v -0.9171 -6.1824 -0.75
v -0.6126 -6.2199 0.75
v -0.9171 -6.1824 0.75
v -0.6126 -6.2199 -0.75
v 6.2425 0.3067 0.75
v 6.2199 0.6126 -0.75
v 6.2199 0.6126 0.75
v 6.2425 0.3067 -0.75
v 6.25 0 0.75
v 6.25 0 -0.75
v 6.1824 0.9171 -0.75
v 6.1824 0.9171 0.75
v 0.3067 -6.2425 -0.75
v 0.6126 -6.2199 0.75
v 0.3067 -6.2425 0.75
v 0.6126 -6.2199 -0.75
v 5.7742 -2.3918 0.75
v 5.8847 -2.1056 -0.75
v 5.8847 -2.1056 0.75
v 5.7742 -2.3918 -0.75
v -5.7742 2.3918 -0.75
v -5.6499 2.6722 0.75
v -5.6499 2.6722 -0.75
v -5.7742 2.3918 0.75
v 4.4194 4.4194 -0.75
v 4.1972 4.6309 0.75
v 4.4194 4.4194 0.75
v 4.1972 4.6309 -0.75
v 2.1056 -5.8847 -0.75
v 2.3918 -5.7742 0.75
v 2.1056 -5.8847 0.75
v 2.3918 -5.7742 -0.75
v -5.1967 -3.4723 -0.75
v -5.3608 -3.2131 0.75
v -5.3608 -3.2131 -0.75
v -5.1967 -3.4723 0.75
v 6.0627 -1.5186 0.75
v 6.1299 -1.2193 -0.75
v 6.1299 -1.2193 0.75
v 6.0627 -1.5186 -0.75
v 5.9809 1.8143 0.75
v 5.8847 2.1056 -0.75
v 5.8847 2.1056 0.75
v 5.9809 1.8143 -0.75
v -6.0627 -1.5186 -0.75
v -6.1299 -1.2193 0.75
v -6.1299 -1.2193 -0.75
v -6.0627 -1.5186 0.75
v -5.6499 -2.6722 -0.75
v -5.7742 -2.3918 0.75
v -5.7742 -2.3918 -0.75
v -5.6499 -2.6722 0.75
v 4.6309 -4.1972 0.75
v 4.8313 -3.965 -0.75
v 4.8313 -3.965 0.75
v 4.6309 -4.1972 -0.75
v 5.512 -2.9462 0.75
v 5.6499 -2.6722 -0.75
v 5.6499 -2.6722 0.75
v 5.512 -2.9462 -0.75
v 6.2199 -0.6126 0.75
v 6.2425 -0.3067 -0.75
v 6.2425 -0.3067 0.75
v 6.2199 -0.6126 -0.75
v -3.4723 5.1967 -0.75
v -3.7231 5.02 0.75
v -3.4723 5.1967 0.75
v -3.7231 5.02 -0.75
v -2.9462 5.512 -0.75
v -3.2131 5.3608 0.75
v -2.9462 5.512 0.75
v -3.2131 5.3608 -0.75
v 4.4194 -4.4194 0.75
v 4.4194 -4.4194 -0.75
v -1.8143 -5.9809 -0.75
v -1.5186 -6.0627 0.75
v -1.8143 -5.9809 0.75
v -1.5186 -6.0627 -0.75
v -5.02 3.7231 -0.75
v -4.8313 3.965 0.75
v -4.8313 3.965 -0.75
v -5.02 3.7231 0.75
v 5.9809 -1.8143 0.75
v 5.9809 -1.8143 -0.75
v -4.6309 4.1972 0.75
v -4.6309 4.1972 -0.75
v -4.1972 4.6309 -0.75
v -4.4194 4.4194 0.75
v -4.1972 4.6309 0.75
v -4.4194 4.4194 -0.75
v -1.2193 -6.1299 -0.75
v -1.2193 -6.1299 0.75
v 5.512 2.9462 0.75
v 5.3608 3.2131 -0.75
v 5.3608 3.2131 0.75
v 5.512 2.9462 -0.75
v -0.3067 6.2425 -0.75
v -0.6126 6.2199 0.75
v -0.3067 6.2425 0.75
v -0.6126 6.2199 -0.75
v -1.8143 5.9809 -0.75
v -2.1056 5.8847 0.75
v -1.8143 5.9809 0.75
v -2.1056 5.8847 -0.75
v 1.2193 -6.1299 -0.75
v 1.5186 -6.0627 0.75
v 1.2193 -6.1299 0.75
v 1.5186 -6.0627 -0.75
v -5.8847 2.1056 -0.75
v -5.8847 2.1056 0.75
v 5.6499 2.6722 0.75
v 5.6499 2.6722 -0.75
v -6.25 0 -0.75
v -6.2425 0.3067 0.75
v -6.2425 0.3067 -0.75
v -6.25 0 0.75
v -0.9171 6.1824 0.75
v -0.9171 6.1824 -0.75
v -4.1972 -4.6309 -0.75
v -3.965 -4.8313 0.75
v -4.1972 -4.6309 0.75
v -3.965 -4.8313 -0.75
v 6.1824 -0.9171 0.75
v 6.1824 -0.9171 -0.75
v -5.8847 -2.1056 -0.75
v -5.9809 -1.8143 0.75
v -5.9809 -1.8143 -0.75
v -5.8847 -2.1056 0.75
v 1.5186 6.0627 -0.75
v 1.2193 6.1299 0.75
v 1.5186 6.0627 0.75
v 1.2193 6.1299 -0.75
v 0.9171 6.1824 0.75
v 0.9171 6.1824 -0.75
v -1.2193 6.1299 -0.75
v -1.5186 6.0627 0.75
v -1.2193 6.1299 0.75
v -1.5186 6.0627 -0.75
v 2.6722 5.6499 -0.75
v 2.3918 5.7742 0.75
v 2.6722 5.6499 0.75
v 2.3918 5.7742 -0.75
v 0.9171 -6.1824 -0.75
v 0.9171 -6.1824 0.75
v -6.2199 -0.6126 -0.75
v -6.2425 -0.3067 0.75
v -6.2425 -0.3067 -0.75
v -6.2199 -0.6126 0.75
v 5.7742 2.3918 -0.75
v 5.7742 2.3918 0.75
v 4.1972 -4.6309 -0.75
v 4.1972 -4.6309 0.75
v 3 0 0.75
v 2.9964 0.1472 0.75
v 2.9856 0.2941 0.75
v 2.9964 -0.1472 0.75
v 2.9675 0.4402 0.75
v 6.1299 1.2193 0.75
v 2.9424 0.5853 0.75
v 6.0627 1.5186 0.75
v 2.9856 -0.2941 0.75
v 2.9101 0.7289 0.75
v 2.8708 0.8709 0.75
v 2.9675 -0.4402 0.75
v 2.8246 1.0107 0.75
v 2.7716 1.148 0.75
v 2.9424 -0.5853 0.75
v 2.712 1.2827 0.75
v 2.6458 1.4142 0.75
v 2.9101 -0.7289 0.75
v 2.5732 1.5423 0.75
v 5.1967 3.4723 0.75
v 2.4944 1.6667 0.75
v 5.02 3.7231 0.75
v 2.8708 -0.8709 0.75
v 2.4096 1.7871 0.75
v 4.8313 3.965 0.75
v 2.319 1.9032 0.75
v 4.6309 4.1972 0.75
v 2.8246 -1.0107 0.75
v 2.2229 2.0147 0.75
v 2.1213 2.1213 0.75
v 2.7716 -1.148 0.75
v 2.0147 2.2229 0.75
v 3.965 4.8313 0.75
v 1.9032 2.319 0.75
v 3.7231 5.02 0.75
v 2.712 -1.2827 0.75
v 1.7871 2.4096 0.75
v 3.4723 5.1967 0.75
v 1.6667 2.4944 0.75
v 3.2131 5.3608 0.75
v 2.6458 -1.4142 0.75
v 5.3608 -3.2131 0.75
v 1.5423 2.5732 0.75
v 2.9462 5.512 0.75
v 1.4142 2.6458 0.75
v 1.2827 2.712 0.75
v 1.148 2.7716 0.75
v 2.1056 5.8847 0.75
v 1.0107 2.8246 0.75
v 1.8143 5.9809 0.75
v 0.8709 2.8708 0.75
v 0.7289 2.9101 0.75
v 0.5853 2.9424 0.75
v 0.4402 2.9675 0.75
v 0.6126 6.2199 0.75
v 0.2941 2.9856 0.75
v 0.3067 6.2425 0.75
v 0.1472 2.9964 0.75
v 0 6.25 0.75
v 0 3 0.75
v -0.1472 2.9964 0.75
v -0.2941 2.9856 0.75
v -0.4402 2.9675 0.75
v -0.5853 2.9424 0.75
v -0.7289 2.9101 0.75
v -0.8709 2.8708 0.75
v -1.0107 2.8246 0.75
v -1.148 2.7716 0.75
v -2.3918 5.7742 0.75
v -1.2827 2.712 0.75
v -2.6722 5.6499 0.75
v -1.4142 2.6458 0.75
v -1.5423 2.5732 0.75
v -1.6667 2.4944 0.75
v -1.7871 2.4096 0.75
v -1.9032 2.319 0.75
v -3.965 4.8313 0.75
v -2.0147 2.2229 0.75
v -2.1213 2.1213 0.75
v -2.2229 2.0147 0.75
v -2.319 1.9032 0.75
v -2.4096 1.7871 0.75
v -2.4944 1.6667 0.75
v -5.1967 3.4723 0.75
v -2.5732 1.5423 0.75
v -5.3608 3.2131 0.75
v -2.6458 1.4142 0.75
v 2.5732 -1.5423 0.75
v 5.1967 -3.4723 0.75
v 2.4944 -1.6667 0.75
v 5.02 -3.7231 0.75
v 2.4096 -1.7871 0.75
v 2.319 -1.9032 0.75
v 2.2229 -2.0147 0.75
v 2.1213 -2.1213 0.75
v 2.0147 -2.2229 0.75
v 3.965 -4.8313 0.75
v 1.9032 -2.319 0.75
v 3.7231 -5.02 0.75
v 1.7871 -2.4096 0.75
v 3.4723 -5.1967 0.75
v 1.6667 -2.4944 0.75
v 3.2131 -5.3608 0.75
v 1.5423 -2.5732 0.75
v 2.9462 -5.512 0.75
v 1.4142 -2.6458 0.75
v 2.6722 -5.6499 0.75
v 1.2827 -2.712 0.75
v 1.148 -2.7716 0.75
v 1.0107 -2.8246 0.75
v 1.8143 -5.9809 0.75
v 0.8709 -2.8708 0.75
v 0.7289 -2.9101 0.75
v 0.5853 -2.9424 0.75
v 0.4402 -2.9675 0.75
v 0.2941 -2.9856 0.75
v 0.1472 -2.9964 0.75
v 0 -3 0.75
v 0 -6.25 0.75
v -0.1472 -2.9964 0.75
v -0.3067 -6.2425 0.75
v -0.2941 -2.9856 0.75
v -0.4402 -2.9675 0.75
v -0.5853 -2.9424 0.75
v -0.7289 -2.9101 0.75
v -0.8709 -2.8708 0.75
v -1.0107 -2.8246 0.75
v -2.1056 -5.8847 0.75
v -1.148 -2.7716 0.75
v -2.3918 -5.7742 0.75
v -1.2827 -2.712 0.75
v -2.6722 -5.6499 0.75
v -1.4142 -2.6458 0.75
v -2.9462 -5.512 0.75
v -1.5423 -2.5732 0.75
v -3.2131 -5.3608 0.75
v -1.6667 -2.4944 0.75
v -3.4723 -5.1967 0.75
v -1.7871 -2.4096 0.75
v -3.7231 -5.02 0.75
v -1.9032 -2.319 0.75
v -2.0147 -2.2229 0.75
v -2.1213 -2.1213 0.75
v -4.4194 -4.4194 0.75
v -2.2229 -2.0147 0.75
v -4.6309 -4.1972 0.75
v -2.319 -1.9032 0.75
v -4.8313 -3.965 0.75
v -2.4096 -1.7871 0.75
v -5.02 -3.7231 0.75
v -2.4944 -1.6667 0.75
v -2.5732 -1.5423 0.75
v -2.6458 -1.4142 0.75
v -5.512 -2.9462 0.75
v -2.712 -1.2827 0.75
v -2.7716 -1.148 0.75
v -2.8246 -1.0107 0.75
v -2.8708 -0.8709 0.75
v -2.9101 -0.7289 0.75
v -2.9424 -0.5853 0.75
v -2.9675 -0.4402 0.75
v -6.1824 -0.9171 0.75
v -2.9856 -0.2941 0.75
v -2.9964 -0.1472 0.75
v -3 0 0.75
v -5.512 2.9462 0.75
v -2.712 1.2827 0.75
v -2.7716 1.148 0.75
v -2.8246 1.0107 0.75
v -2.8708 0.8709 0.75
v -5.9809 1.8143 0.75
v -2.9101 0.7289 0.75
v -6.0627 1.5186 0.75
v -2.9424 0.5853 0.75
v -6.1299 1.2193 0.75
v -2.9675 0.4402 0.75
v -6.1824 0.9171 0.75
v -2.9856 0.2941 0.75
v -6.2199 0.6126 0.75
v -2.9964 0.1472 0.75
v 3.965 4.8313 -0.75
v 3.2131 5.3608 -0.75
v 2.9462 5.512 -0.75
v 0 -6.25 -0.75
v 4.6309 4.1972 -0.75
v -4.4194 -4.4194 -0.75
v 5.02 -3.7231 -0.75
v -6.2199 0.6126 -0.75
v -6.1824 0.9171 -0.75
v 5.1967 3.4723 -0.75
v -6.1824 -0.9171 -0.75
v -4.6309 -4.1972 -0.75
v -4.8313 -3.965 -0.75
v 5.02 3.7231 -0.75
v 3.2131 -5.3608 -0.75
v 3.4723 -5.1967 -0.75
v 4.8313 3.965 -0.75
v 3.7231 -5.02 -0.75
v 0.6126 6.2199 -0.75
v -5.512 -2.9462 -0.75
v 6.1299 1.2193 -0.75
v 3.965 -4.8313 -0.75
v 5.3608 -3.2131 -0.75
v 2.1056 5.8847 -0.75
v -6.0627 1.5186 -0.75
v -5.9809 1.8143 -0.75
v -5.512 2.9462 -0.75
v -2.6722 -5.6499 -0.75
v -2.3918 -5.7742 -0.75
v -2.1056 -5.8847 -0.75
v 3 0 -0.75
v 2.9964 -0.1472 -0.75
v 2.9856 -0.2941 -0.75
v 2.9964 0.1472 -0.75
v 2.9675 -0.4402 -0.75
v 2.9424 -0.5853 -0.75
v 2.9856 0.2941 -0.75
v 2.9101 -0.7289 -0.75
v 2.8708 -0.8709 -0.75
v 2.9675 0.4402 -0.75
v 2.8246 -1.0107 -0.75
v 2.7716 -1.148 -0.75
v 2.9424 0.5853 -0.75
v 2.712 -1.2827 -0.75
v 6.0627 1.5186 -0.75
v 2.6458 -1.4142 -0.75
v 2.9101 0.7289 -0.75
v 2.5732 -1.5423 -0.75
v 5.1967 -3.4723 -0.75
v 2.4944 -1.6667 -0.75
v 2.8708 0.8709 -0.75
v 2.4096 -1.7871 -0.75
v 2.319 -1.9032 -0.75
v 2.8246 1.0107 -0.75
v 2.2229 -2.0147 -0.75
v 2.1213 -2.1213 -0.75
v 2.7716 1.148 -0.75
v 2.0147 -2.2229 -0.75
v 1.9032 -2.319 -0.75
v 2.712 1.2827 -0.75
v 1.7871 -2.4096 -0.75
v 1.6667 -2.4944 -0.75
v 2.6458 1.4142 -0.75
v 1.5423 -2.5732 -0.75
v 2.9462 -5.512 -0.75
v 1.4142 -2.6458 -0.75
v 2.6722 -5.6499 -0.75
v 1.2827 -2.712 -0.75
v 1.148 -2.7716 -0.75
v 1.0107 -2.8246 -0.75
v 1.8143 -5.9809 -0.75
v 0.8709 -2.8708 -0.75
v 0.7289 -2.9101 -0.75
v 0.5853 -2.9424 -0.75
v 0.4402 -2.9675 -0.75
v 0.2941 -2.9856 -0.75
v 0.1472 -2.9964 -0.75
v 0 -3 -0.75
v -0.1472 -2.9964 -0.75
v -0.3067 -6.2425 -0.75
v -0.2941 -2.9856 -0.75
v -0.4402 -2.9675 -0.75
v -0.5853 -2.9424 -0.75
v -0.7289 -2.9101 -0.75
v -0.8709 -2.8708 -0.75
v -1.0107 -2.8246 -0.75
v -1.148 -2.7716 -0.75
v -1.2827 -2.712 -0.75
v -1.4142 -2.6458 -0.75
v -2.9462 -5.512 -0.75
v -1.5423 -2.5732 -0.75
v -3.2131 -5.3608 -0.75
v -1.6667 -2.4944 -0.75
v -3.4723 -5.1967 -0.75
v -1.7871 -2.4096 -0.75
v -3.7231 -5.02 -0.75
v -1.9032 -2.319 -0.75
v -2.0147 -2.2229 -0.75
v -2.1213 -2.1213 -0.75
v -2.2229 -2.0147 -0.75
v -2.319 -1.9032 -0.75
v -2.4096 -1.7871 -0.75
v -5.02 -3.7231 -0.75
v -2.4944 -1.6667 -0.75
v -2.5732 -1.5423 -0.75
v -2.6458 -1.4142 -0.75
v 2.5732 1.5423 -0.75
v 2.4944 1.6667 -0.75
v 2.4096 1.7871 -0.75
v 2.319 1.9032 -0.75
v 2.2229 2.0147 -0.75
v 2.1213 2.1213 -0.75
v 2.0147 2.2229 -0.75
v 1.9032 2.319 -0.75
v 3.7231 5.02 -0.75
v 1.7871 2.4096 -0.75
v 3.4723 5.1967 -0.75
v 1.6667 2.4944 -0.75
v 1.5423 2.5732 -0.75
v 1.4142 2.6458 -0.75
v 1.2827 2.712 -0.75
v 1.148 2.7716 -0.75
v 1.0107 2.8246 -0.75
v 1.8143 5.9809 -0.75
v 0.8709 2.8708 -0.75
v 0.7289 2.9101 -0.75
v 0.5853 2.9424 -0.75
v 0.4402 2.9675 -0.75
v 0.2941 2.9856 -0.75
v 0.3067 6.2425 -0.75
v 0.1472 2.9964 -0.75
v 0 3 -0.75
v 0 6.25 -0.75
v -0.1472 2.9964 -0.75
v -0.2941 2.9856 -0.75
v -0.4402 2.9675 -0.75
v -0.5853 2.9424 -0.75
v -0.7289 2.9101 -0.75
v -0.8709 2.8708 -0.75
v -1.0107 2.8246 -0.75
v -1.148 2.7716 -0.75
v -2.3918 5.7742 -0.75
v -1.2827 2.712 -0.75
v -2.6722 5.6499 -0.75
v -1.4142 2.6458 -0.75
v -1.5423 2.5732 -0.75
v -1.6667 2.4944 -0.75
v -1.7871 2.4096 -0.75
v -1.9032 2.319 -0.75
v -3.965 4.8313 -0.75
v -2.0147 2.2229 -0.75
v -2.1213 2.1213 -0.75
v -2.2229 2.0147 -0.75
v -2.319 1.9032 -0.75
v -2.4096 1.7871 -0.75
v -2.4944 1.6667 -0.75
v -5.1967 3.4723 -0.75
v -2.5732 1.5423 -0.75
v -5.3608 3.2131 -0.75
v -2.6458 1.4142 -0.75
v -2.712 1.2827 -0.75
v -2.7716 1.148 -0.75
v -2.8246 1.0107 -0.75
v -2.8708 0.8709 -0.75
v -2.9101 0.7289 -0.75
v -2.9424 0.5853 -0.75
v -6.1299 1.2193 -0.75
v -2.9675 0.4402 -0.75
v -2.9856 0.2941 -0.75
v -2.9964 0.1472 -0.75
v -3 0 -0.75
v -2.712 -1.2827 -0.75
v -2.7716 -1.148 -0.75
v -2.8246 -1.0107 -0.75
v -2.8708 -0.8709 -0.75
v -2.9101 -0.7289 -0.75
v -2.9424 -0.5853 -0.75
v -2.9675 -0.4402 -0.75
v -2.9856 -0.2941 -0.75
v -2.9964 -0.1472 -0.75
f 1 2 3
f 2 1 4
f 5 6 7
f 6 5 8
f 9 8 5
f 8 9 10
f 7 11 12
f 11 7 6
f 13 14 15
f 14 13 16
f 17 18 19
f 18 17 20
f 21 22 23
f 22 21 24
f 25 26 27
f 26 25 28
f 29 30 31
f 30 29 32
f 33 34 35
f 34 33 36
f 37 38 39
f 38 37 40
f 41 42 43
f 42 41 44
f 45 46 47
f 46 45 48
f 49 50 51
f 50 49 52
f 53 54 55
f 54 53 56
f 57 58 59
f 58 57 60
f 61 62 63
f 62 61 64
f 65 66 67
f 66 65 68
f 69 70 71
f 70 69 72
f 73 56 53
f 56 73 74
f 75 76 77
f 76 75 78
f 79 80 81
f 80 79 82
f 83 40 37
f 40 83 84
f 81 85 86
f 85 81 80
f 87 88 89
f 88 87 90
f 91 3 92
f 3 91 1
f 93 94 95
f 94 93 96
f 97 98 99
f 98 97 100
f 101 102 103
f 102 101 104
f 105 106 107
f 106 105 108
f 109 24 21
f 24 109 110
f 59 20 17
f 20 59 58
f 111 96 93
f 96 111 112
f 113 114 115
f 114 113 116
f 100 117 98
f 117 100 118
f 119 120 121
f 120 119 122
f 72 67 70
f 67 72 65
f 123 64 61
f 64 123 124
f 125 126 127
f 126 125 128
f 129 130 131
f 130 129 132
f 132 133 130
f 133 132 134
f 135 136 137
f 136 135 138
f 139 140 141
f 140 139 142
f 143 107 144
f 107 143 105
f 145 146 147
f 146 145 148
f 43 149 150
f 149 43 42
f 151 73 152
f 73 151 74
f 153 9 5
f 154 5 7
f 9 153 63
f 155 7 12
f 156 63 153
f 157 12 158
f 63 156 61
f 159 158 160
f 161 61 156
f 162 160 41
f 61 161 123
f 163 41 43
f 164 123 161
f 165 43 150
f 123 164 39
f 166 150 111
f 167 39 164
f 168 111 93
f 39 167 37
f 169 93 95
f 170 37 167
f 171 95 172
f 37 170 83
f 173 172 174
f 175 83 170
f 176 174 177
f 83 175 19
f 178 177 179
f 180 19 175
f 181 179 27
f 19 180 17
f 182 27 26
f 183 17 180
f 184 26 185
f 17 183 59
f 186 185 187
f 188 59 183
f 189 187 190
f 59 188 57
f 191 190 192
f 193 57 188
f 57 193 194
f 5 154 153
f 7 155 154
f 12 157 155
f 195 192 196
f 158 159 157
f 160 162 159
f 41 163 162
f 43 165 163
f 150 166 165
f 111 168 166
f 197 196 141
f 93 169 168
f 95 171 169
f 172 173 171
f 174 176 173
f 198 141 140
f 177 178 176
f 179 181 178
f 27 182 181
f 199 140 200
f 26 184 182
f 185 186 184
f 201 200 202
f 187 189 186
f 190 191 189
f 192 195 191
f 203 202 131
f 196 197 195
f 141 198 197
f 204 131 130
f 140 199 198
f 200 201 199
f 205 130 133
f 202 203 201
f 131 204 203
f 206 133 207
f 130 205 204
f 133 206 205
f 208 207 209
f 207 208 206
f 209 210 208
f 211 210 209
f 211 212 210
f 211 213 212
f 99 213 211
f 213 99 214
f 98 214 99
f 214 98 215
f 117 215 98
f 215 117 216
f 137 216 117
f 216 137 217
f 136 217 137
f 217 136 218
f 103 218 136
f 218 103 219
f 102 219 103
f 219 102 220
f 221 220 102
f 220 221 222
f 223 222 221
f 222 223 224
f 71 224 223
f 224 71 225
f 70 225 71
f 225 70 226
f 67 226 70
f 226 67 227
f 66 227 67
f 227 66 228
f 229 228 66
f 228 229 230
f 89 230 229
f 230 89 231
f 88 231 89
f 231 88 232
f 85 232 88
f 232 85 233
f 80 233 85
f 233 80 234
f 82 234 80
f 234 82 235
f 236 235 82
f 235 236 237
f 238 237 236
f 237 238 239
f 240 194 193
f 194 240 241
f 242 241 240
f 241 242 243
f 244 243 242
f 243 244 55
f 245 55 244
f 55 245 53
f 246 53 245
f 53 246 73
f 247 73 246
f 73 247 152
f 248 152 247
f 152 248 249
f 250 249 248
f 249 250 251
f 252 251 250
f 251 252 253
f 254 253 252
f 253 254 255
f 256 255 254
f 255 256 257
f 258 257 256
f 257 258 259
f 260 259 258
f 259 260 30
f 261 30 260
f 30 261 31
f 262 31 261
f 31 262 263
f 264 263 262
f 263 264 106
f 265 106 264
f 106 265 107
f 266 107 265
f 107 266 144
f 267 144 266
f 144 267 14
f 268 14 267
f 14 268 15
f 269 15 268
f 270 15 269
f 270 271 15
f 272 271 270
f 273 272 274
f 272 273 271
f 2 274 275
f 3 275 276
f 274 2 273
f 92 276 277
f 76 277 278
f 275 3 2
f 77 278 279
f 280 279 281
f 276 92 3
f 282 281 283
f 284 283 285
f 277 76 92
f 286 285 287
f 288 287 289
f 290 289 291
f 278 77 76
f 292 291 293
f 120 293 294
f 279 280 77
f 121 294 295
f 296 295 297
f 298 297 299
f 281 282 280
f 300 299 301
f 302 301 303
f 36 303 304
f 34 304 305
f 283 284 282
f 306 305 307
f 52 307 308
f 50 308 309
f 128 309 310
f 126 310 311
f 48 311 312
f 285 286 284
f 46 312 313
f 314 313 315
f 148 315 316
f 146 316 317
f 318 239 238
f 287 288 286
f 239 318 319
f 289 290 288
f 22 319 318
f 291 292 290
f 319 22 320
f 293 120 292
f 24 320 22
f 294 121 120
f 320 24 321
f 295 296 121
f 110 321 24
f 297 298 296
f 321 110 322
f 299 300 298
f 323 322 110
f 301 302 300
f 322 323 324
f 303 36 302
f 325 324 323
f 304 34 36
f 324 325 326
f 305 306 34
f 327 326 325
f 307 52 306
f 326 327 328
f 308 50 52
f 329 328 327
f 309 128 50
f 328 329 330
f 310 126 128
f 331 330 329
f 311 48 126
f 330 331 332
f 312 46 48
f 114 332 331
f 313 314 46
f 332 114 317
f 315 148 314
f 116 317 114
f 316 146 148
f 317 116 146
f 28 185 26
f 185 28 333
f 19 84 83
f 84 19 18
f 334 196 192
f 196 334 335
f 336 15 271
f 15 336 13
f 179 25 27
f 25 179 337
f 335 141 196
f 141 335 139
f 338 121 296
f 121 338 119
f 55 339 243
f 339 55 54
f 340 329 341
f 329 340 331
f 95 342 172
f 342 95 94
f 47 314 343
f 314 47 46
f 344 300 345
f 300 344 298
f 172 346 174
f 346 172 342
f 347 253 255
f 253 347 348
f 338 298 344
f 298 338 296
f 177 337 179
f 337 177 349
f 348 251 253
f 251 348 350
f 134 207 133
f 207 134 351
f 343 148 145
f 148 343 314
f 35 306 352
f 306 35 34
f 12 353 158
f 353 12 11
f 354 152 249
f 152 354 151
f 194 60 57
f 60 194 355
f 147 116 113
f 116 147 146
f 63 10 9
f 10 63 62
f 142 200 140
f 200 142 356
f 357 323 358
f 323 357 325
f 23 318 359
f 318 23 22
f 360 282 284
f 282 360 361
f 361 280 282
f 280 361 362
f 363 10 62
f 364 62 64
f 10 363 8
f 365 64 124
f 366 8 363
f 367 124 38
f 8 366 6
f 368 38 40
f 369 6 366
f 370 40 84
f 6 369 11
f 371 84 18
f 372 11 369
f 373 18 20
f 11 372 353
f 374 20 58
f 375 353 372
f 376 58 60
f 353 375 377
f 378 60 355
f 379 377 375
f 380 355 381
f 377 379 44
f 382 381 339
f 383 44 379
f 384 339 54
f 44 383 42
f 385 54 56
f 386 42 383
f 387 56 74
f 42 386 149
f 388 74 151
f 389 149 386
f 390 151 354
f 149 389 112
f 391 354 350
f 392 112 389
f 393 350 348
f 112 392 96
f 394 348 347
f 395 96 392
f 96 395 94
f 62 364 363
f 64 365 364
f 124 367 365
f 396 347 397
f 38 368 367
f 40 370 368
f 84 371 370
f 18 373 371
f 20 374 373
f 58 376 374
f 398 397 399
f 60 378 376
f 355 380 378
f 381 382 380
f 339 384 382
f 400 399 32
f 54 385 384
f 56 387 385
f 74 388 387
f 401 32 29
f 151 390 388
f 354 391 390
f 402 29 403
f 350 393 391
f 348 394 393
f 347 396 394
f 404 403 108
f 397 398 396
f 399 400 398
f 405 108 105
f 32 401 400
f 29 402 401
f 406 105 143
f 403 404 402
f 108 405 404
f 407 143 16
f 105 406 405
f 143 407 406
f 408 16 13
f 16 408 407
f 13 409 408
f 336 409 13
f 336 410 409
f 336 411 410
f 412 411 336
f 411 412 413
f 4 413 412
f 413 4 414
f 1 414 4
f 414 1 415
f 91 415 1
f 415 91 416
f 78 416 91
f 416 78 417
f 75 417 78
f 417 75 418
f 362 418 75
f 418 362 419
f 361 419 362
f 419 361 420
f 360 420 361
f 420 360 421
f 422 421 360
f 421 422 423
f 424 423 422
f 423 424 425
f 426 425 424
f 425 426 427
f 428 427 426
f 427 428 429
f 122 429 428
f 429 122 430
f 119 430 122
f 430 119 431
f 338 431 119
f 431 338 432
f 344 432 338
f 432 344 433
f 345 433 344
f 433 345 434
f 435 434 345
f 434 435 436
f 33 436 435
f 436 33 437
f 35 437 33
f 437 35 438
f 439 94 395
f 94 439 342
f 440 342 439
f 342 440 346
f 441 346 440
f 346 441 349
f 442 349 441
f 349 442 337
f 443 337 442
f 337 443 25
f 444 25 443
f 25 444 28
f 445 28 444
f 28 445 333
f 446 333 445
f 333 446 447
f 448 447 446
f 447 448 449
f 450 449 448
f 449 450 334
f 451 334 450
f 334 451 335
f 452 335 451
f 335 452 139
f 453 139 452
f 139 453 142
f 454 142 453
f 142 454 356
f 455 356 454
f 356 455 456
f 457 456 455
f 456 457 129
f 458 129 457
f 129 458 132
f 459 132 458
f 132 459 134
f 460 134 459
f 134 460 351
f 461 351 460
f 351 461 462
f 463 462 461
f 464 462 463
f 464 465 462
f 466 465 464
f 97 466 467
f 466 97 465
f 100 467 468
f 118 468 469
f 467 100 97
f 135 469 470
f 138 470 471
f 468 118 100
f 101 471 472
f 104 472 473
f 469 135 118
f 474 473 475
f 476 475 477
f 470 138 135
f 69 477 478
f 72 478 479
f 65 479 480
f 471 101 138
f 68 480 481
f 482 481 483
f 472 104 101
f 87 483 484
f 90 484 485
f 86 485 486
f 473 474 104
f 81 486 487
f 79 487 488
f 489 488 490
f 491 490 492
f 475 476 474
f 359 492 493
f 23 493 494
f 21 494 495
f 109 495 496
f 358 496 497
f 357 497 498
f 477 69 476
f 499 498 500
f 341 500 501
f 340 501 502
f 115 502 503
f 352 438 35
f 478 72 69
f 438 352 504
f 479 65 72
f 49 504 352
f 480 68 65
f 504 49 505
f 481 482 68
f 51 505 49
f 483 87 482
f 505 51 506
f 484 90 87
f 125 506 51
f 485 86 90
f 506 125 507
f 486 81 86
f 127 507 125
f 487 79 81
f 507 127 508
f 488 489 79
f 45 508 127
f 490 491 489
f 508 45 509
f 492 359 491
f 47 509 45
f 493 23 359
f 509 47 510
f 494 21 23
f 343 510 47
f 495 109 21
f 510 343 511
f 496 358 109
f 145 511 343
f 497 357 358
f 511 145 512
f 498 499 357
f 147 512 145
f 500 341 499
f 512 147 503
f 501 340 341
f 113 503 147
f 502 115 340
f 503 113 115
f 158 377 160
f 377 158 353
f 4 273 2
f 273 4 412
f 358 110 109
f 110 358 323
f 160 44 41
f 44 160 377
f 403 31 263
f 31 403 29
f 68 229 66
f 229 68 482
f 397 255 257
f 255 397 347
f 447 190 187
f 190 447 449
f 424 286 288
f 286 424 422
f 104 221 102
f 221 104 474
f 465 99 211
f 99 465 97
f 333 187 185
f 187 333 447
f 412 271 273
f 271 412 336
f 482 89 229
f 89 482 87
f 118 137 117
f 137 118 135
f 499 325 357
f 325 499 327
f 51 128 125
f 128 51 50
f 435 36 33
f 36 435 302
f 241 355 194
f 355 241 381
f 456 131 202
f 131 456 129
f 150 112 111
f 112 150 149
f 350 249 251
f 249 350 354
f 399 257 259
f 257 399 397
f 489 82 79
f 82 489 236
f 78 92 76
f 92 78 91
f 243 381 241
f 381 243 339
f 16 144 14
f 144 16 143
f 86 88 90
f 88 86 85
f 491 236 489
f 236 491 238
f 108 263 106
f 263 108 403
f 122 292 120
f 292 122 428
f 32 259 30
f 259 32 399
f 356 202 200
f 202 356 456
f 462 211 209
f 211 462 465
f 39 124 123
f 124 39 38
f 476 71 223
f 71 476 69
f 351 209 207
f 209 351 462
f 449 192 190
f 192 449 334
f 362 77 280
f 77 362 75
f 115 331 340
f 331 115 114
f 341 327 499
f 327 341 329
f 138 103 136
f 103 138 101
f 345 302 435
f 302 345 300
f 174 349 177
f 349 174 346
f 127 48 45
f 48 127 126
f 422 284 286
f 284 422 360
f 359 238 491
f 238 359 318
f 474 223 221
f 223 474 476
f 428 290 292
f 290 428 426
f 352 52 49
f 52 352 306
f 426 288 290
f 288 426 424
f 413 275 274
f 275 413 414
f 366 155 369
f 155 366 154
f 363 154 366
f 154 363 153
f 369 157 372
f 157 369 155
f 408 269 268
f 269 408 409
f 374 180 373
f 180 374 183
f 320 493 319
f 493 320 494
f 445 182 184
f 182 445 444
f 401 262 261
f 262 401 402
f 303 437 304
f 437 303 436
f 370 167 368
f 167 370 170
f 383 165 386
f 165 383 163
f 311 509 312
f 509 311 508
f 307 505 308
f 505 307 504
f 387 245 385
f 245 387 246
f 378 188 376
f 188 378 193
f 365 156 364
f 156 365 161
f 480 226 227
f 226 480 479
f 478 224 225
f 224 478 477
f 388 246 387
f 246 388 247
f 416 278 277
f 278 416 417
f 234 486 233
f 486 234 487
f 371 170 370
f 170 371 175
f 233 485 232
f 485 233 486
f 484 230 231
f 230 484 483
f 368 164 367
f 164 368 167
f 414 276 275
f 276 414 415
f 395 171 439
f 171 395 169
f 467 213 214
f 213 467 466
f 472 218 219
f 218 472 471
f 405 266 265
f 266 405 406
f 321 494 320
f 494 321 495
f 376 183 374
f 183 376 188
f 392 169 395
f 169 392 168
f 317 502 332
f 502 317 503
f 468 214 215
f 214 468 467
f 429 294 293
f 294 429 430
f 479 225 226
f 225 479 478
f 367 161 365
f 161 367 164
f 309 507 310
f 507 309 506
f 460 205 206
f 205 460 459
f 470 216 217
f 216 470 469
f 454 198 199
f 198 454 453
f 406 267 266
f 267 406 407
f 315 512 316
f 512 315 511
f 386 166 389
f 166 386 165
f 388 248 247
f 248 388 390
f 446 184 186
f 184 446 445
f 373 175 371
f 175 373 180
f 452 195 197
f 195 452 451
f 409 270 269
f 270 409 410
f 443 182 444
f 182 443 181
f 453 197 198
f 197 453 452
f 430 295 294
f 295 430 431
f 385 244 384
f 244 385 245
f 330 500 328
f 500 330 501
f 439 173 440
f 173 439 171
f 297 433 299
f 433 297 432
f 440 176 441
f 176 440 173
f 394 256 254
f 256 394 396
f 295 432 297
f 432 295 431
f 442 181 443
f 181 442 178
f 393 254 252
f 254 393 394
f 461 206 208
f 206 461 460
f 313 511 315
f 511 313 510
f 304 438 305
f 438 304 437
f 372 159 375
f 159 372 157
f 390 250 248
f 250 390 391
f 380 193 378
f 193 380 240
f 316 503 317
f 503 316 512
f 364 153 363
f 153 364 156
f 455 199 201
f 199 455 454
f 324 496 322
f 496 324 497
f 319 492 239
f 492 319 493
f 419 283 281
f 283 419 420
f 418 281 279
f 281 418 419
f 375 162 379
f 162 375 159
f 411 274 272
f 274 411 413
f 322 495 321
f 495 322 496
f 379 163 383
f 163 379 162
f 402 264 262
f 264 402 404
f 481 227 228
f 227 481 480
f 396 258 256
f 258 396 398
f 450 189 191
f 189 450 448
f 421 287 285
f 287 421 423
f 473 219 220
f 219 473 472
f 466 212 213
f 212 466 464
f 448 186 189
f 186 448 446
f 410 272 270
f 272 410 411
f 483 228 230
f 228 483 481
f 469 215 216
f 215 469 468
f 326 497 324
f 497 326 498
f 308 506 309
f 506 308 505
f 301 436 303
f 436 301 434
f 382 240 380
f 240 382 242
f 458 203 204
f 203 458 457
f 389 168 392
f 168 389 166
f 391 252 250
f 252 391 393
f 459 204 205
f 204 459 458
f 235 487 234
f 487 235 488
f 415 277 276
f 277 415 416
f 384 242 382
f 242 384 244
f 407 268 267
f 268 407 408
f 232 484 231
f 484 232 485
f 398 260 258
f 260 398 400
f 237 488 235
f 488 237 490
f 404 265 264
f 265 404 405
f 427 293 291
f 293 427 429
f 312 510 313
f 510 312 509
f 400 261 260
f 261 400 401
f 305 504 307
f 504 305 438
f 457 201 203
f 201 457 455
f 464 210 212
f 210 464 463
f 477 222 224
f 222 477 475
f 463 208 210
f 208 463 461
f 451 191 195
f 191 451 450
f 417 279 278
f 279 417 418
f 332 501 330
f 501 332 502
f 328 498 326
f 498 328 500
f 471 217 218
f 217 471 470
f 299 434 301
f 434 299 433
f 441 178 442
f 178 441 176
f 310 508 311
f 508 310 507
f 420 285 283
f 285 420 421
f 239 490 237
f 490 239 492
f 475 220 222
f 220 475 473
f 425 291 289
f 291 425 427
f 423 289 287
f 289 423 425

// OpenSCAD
// Flat washer parameters (mm)
inner_diameter_mm = 6.0;   //[3:12:0.1]
outer_diameter_mm = 12.5;  //[6.25:25:0.1]
thickness_mm      = 1.5;   //[0.75:3:0.05]

// Small extra height to guarantee a clean through-hole in CSG
eps_mm = 0.2; //[0.01:1:0.01]

$fn = 128;

module flat_washer(id, od, t) {
    difference() {
        cylinder(d=od, h=t, center=true);
        cylinder(d=id, h=t + 2*eps_mm, center=true);
    }
}

flat_washer(inner_diameter_mm, outer_diameter_mm, thickness_mm);
